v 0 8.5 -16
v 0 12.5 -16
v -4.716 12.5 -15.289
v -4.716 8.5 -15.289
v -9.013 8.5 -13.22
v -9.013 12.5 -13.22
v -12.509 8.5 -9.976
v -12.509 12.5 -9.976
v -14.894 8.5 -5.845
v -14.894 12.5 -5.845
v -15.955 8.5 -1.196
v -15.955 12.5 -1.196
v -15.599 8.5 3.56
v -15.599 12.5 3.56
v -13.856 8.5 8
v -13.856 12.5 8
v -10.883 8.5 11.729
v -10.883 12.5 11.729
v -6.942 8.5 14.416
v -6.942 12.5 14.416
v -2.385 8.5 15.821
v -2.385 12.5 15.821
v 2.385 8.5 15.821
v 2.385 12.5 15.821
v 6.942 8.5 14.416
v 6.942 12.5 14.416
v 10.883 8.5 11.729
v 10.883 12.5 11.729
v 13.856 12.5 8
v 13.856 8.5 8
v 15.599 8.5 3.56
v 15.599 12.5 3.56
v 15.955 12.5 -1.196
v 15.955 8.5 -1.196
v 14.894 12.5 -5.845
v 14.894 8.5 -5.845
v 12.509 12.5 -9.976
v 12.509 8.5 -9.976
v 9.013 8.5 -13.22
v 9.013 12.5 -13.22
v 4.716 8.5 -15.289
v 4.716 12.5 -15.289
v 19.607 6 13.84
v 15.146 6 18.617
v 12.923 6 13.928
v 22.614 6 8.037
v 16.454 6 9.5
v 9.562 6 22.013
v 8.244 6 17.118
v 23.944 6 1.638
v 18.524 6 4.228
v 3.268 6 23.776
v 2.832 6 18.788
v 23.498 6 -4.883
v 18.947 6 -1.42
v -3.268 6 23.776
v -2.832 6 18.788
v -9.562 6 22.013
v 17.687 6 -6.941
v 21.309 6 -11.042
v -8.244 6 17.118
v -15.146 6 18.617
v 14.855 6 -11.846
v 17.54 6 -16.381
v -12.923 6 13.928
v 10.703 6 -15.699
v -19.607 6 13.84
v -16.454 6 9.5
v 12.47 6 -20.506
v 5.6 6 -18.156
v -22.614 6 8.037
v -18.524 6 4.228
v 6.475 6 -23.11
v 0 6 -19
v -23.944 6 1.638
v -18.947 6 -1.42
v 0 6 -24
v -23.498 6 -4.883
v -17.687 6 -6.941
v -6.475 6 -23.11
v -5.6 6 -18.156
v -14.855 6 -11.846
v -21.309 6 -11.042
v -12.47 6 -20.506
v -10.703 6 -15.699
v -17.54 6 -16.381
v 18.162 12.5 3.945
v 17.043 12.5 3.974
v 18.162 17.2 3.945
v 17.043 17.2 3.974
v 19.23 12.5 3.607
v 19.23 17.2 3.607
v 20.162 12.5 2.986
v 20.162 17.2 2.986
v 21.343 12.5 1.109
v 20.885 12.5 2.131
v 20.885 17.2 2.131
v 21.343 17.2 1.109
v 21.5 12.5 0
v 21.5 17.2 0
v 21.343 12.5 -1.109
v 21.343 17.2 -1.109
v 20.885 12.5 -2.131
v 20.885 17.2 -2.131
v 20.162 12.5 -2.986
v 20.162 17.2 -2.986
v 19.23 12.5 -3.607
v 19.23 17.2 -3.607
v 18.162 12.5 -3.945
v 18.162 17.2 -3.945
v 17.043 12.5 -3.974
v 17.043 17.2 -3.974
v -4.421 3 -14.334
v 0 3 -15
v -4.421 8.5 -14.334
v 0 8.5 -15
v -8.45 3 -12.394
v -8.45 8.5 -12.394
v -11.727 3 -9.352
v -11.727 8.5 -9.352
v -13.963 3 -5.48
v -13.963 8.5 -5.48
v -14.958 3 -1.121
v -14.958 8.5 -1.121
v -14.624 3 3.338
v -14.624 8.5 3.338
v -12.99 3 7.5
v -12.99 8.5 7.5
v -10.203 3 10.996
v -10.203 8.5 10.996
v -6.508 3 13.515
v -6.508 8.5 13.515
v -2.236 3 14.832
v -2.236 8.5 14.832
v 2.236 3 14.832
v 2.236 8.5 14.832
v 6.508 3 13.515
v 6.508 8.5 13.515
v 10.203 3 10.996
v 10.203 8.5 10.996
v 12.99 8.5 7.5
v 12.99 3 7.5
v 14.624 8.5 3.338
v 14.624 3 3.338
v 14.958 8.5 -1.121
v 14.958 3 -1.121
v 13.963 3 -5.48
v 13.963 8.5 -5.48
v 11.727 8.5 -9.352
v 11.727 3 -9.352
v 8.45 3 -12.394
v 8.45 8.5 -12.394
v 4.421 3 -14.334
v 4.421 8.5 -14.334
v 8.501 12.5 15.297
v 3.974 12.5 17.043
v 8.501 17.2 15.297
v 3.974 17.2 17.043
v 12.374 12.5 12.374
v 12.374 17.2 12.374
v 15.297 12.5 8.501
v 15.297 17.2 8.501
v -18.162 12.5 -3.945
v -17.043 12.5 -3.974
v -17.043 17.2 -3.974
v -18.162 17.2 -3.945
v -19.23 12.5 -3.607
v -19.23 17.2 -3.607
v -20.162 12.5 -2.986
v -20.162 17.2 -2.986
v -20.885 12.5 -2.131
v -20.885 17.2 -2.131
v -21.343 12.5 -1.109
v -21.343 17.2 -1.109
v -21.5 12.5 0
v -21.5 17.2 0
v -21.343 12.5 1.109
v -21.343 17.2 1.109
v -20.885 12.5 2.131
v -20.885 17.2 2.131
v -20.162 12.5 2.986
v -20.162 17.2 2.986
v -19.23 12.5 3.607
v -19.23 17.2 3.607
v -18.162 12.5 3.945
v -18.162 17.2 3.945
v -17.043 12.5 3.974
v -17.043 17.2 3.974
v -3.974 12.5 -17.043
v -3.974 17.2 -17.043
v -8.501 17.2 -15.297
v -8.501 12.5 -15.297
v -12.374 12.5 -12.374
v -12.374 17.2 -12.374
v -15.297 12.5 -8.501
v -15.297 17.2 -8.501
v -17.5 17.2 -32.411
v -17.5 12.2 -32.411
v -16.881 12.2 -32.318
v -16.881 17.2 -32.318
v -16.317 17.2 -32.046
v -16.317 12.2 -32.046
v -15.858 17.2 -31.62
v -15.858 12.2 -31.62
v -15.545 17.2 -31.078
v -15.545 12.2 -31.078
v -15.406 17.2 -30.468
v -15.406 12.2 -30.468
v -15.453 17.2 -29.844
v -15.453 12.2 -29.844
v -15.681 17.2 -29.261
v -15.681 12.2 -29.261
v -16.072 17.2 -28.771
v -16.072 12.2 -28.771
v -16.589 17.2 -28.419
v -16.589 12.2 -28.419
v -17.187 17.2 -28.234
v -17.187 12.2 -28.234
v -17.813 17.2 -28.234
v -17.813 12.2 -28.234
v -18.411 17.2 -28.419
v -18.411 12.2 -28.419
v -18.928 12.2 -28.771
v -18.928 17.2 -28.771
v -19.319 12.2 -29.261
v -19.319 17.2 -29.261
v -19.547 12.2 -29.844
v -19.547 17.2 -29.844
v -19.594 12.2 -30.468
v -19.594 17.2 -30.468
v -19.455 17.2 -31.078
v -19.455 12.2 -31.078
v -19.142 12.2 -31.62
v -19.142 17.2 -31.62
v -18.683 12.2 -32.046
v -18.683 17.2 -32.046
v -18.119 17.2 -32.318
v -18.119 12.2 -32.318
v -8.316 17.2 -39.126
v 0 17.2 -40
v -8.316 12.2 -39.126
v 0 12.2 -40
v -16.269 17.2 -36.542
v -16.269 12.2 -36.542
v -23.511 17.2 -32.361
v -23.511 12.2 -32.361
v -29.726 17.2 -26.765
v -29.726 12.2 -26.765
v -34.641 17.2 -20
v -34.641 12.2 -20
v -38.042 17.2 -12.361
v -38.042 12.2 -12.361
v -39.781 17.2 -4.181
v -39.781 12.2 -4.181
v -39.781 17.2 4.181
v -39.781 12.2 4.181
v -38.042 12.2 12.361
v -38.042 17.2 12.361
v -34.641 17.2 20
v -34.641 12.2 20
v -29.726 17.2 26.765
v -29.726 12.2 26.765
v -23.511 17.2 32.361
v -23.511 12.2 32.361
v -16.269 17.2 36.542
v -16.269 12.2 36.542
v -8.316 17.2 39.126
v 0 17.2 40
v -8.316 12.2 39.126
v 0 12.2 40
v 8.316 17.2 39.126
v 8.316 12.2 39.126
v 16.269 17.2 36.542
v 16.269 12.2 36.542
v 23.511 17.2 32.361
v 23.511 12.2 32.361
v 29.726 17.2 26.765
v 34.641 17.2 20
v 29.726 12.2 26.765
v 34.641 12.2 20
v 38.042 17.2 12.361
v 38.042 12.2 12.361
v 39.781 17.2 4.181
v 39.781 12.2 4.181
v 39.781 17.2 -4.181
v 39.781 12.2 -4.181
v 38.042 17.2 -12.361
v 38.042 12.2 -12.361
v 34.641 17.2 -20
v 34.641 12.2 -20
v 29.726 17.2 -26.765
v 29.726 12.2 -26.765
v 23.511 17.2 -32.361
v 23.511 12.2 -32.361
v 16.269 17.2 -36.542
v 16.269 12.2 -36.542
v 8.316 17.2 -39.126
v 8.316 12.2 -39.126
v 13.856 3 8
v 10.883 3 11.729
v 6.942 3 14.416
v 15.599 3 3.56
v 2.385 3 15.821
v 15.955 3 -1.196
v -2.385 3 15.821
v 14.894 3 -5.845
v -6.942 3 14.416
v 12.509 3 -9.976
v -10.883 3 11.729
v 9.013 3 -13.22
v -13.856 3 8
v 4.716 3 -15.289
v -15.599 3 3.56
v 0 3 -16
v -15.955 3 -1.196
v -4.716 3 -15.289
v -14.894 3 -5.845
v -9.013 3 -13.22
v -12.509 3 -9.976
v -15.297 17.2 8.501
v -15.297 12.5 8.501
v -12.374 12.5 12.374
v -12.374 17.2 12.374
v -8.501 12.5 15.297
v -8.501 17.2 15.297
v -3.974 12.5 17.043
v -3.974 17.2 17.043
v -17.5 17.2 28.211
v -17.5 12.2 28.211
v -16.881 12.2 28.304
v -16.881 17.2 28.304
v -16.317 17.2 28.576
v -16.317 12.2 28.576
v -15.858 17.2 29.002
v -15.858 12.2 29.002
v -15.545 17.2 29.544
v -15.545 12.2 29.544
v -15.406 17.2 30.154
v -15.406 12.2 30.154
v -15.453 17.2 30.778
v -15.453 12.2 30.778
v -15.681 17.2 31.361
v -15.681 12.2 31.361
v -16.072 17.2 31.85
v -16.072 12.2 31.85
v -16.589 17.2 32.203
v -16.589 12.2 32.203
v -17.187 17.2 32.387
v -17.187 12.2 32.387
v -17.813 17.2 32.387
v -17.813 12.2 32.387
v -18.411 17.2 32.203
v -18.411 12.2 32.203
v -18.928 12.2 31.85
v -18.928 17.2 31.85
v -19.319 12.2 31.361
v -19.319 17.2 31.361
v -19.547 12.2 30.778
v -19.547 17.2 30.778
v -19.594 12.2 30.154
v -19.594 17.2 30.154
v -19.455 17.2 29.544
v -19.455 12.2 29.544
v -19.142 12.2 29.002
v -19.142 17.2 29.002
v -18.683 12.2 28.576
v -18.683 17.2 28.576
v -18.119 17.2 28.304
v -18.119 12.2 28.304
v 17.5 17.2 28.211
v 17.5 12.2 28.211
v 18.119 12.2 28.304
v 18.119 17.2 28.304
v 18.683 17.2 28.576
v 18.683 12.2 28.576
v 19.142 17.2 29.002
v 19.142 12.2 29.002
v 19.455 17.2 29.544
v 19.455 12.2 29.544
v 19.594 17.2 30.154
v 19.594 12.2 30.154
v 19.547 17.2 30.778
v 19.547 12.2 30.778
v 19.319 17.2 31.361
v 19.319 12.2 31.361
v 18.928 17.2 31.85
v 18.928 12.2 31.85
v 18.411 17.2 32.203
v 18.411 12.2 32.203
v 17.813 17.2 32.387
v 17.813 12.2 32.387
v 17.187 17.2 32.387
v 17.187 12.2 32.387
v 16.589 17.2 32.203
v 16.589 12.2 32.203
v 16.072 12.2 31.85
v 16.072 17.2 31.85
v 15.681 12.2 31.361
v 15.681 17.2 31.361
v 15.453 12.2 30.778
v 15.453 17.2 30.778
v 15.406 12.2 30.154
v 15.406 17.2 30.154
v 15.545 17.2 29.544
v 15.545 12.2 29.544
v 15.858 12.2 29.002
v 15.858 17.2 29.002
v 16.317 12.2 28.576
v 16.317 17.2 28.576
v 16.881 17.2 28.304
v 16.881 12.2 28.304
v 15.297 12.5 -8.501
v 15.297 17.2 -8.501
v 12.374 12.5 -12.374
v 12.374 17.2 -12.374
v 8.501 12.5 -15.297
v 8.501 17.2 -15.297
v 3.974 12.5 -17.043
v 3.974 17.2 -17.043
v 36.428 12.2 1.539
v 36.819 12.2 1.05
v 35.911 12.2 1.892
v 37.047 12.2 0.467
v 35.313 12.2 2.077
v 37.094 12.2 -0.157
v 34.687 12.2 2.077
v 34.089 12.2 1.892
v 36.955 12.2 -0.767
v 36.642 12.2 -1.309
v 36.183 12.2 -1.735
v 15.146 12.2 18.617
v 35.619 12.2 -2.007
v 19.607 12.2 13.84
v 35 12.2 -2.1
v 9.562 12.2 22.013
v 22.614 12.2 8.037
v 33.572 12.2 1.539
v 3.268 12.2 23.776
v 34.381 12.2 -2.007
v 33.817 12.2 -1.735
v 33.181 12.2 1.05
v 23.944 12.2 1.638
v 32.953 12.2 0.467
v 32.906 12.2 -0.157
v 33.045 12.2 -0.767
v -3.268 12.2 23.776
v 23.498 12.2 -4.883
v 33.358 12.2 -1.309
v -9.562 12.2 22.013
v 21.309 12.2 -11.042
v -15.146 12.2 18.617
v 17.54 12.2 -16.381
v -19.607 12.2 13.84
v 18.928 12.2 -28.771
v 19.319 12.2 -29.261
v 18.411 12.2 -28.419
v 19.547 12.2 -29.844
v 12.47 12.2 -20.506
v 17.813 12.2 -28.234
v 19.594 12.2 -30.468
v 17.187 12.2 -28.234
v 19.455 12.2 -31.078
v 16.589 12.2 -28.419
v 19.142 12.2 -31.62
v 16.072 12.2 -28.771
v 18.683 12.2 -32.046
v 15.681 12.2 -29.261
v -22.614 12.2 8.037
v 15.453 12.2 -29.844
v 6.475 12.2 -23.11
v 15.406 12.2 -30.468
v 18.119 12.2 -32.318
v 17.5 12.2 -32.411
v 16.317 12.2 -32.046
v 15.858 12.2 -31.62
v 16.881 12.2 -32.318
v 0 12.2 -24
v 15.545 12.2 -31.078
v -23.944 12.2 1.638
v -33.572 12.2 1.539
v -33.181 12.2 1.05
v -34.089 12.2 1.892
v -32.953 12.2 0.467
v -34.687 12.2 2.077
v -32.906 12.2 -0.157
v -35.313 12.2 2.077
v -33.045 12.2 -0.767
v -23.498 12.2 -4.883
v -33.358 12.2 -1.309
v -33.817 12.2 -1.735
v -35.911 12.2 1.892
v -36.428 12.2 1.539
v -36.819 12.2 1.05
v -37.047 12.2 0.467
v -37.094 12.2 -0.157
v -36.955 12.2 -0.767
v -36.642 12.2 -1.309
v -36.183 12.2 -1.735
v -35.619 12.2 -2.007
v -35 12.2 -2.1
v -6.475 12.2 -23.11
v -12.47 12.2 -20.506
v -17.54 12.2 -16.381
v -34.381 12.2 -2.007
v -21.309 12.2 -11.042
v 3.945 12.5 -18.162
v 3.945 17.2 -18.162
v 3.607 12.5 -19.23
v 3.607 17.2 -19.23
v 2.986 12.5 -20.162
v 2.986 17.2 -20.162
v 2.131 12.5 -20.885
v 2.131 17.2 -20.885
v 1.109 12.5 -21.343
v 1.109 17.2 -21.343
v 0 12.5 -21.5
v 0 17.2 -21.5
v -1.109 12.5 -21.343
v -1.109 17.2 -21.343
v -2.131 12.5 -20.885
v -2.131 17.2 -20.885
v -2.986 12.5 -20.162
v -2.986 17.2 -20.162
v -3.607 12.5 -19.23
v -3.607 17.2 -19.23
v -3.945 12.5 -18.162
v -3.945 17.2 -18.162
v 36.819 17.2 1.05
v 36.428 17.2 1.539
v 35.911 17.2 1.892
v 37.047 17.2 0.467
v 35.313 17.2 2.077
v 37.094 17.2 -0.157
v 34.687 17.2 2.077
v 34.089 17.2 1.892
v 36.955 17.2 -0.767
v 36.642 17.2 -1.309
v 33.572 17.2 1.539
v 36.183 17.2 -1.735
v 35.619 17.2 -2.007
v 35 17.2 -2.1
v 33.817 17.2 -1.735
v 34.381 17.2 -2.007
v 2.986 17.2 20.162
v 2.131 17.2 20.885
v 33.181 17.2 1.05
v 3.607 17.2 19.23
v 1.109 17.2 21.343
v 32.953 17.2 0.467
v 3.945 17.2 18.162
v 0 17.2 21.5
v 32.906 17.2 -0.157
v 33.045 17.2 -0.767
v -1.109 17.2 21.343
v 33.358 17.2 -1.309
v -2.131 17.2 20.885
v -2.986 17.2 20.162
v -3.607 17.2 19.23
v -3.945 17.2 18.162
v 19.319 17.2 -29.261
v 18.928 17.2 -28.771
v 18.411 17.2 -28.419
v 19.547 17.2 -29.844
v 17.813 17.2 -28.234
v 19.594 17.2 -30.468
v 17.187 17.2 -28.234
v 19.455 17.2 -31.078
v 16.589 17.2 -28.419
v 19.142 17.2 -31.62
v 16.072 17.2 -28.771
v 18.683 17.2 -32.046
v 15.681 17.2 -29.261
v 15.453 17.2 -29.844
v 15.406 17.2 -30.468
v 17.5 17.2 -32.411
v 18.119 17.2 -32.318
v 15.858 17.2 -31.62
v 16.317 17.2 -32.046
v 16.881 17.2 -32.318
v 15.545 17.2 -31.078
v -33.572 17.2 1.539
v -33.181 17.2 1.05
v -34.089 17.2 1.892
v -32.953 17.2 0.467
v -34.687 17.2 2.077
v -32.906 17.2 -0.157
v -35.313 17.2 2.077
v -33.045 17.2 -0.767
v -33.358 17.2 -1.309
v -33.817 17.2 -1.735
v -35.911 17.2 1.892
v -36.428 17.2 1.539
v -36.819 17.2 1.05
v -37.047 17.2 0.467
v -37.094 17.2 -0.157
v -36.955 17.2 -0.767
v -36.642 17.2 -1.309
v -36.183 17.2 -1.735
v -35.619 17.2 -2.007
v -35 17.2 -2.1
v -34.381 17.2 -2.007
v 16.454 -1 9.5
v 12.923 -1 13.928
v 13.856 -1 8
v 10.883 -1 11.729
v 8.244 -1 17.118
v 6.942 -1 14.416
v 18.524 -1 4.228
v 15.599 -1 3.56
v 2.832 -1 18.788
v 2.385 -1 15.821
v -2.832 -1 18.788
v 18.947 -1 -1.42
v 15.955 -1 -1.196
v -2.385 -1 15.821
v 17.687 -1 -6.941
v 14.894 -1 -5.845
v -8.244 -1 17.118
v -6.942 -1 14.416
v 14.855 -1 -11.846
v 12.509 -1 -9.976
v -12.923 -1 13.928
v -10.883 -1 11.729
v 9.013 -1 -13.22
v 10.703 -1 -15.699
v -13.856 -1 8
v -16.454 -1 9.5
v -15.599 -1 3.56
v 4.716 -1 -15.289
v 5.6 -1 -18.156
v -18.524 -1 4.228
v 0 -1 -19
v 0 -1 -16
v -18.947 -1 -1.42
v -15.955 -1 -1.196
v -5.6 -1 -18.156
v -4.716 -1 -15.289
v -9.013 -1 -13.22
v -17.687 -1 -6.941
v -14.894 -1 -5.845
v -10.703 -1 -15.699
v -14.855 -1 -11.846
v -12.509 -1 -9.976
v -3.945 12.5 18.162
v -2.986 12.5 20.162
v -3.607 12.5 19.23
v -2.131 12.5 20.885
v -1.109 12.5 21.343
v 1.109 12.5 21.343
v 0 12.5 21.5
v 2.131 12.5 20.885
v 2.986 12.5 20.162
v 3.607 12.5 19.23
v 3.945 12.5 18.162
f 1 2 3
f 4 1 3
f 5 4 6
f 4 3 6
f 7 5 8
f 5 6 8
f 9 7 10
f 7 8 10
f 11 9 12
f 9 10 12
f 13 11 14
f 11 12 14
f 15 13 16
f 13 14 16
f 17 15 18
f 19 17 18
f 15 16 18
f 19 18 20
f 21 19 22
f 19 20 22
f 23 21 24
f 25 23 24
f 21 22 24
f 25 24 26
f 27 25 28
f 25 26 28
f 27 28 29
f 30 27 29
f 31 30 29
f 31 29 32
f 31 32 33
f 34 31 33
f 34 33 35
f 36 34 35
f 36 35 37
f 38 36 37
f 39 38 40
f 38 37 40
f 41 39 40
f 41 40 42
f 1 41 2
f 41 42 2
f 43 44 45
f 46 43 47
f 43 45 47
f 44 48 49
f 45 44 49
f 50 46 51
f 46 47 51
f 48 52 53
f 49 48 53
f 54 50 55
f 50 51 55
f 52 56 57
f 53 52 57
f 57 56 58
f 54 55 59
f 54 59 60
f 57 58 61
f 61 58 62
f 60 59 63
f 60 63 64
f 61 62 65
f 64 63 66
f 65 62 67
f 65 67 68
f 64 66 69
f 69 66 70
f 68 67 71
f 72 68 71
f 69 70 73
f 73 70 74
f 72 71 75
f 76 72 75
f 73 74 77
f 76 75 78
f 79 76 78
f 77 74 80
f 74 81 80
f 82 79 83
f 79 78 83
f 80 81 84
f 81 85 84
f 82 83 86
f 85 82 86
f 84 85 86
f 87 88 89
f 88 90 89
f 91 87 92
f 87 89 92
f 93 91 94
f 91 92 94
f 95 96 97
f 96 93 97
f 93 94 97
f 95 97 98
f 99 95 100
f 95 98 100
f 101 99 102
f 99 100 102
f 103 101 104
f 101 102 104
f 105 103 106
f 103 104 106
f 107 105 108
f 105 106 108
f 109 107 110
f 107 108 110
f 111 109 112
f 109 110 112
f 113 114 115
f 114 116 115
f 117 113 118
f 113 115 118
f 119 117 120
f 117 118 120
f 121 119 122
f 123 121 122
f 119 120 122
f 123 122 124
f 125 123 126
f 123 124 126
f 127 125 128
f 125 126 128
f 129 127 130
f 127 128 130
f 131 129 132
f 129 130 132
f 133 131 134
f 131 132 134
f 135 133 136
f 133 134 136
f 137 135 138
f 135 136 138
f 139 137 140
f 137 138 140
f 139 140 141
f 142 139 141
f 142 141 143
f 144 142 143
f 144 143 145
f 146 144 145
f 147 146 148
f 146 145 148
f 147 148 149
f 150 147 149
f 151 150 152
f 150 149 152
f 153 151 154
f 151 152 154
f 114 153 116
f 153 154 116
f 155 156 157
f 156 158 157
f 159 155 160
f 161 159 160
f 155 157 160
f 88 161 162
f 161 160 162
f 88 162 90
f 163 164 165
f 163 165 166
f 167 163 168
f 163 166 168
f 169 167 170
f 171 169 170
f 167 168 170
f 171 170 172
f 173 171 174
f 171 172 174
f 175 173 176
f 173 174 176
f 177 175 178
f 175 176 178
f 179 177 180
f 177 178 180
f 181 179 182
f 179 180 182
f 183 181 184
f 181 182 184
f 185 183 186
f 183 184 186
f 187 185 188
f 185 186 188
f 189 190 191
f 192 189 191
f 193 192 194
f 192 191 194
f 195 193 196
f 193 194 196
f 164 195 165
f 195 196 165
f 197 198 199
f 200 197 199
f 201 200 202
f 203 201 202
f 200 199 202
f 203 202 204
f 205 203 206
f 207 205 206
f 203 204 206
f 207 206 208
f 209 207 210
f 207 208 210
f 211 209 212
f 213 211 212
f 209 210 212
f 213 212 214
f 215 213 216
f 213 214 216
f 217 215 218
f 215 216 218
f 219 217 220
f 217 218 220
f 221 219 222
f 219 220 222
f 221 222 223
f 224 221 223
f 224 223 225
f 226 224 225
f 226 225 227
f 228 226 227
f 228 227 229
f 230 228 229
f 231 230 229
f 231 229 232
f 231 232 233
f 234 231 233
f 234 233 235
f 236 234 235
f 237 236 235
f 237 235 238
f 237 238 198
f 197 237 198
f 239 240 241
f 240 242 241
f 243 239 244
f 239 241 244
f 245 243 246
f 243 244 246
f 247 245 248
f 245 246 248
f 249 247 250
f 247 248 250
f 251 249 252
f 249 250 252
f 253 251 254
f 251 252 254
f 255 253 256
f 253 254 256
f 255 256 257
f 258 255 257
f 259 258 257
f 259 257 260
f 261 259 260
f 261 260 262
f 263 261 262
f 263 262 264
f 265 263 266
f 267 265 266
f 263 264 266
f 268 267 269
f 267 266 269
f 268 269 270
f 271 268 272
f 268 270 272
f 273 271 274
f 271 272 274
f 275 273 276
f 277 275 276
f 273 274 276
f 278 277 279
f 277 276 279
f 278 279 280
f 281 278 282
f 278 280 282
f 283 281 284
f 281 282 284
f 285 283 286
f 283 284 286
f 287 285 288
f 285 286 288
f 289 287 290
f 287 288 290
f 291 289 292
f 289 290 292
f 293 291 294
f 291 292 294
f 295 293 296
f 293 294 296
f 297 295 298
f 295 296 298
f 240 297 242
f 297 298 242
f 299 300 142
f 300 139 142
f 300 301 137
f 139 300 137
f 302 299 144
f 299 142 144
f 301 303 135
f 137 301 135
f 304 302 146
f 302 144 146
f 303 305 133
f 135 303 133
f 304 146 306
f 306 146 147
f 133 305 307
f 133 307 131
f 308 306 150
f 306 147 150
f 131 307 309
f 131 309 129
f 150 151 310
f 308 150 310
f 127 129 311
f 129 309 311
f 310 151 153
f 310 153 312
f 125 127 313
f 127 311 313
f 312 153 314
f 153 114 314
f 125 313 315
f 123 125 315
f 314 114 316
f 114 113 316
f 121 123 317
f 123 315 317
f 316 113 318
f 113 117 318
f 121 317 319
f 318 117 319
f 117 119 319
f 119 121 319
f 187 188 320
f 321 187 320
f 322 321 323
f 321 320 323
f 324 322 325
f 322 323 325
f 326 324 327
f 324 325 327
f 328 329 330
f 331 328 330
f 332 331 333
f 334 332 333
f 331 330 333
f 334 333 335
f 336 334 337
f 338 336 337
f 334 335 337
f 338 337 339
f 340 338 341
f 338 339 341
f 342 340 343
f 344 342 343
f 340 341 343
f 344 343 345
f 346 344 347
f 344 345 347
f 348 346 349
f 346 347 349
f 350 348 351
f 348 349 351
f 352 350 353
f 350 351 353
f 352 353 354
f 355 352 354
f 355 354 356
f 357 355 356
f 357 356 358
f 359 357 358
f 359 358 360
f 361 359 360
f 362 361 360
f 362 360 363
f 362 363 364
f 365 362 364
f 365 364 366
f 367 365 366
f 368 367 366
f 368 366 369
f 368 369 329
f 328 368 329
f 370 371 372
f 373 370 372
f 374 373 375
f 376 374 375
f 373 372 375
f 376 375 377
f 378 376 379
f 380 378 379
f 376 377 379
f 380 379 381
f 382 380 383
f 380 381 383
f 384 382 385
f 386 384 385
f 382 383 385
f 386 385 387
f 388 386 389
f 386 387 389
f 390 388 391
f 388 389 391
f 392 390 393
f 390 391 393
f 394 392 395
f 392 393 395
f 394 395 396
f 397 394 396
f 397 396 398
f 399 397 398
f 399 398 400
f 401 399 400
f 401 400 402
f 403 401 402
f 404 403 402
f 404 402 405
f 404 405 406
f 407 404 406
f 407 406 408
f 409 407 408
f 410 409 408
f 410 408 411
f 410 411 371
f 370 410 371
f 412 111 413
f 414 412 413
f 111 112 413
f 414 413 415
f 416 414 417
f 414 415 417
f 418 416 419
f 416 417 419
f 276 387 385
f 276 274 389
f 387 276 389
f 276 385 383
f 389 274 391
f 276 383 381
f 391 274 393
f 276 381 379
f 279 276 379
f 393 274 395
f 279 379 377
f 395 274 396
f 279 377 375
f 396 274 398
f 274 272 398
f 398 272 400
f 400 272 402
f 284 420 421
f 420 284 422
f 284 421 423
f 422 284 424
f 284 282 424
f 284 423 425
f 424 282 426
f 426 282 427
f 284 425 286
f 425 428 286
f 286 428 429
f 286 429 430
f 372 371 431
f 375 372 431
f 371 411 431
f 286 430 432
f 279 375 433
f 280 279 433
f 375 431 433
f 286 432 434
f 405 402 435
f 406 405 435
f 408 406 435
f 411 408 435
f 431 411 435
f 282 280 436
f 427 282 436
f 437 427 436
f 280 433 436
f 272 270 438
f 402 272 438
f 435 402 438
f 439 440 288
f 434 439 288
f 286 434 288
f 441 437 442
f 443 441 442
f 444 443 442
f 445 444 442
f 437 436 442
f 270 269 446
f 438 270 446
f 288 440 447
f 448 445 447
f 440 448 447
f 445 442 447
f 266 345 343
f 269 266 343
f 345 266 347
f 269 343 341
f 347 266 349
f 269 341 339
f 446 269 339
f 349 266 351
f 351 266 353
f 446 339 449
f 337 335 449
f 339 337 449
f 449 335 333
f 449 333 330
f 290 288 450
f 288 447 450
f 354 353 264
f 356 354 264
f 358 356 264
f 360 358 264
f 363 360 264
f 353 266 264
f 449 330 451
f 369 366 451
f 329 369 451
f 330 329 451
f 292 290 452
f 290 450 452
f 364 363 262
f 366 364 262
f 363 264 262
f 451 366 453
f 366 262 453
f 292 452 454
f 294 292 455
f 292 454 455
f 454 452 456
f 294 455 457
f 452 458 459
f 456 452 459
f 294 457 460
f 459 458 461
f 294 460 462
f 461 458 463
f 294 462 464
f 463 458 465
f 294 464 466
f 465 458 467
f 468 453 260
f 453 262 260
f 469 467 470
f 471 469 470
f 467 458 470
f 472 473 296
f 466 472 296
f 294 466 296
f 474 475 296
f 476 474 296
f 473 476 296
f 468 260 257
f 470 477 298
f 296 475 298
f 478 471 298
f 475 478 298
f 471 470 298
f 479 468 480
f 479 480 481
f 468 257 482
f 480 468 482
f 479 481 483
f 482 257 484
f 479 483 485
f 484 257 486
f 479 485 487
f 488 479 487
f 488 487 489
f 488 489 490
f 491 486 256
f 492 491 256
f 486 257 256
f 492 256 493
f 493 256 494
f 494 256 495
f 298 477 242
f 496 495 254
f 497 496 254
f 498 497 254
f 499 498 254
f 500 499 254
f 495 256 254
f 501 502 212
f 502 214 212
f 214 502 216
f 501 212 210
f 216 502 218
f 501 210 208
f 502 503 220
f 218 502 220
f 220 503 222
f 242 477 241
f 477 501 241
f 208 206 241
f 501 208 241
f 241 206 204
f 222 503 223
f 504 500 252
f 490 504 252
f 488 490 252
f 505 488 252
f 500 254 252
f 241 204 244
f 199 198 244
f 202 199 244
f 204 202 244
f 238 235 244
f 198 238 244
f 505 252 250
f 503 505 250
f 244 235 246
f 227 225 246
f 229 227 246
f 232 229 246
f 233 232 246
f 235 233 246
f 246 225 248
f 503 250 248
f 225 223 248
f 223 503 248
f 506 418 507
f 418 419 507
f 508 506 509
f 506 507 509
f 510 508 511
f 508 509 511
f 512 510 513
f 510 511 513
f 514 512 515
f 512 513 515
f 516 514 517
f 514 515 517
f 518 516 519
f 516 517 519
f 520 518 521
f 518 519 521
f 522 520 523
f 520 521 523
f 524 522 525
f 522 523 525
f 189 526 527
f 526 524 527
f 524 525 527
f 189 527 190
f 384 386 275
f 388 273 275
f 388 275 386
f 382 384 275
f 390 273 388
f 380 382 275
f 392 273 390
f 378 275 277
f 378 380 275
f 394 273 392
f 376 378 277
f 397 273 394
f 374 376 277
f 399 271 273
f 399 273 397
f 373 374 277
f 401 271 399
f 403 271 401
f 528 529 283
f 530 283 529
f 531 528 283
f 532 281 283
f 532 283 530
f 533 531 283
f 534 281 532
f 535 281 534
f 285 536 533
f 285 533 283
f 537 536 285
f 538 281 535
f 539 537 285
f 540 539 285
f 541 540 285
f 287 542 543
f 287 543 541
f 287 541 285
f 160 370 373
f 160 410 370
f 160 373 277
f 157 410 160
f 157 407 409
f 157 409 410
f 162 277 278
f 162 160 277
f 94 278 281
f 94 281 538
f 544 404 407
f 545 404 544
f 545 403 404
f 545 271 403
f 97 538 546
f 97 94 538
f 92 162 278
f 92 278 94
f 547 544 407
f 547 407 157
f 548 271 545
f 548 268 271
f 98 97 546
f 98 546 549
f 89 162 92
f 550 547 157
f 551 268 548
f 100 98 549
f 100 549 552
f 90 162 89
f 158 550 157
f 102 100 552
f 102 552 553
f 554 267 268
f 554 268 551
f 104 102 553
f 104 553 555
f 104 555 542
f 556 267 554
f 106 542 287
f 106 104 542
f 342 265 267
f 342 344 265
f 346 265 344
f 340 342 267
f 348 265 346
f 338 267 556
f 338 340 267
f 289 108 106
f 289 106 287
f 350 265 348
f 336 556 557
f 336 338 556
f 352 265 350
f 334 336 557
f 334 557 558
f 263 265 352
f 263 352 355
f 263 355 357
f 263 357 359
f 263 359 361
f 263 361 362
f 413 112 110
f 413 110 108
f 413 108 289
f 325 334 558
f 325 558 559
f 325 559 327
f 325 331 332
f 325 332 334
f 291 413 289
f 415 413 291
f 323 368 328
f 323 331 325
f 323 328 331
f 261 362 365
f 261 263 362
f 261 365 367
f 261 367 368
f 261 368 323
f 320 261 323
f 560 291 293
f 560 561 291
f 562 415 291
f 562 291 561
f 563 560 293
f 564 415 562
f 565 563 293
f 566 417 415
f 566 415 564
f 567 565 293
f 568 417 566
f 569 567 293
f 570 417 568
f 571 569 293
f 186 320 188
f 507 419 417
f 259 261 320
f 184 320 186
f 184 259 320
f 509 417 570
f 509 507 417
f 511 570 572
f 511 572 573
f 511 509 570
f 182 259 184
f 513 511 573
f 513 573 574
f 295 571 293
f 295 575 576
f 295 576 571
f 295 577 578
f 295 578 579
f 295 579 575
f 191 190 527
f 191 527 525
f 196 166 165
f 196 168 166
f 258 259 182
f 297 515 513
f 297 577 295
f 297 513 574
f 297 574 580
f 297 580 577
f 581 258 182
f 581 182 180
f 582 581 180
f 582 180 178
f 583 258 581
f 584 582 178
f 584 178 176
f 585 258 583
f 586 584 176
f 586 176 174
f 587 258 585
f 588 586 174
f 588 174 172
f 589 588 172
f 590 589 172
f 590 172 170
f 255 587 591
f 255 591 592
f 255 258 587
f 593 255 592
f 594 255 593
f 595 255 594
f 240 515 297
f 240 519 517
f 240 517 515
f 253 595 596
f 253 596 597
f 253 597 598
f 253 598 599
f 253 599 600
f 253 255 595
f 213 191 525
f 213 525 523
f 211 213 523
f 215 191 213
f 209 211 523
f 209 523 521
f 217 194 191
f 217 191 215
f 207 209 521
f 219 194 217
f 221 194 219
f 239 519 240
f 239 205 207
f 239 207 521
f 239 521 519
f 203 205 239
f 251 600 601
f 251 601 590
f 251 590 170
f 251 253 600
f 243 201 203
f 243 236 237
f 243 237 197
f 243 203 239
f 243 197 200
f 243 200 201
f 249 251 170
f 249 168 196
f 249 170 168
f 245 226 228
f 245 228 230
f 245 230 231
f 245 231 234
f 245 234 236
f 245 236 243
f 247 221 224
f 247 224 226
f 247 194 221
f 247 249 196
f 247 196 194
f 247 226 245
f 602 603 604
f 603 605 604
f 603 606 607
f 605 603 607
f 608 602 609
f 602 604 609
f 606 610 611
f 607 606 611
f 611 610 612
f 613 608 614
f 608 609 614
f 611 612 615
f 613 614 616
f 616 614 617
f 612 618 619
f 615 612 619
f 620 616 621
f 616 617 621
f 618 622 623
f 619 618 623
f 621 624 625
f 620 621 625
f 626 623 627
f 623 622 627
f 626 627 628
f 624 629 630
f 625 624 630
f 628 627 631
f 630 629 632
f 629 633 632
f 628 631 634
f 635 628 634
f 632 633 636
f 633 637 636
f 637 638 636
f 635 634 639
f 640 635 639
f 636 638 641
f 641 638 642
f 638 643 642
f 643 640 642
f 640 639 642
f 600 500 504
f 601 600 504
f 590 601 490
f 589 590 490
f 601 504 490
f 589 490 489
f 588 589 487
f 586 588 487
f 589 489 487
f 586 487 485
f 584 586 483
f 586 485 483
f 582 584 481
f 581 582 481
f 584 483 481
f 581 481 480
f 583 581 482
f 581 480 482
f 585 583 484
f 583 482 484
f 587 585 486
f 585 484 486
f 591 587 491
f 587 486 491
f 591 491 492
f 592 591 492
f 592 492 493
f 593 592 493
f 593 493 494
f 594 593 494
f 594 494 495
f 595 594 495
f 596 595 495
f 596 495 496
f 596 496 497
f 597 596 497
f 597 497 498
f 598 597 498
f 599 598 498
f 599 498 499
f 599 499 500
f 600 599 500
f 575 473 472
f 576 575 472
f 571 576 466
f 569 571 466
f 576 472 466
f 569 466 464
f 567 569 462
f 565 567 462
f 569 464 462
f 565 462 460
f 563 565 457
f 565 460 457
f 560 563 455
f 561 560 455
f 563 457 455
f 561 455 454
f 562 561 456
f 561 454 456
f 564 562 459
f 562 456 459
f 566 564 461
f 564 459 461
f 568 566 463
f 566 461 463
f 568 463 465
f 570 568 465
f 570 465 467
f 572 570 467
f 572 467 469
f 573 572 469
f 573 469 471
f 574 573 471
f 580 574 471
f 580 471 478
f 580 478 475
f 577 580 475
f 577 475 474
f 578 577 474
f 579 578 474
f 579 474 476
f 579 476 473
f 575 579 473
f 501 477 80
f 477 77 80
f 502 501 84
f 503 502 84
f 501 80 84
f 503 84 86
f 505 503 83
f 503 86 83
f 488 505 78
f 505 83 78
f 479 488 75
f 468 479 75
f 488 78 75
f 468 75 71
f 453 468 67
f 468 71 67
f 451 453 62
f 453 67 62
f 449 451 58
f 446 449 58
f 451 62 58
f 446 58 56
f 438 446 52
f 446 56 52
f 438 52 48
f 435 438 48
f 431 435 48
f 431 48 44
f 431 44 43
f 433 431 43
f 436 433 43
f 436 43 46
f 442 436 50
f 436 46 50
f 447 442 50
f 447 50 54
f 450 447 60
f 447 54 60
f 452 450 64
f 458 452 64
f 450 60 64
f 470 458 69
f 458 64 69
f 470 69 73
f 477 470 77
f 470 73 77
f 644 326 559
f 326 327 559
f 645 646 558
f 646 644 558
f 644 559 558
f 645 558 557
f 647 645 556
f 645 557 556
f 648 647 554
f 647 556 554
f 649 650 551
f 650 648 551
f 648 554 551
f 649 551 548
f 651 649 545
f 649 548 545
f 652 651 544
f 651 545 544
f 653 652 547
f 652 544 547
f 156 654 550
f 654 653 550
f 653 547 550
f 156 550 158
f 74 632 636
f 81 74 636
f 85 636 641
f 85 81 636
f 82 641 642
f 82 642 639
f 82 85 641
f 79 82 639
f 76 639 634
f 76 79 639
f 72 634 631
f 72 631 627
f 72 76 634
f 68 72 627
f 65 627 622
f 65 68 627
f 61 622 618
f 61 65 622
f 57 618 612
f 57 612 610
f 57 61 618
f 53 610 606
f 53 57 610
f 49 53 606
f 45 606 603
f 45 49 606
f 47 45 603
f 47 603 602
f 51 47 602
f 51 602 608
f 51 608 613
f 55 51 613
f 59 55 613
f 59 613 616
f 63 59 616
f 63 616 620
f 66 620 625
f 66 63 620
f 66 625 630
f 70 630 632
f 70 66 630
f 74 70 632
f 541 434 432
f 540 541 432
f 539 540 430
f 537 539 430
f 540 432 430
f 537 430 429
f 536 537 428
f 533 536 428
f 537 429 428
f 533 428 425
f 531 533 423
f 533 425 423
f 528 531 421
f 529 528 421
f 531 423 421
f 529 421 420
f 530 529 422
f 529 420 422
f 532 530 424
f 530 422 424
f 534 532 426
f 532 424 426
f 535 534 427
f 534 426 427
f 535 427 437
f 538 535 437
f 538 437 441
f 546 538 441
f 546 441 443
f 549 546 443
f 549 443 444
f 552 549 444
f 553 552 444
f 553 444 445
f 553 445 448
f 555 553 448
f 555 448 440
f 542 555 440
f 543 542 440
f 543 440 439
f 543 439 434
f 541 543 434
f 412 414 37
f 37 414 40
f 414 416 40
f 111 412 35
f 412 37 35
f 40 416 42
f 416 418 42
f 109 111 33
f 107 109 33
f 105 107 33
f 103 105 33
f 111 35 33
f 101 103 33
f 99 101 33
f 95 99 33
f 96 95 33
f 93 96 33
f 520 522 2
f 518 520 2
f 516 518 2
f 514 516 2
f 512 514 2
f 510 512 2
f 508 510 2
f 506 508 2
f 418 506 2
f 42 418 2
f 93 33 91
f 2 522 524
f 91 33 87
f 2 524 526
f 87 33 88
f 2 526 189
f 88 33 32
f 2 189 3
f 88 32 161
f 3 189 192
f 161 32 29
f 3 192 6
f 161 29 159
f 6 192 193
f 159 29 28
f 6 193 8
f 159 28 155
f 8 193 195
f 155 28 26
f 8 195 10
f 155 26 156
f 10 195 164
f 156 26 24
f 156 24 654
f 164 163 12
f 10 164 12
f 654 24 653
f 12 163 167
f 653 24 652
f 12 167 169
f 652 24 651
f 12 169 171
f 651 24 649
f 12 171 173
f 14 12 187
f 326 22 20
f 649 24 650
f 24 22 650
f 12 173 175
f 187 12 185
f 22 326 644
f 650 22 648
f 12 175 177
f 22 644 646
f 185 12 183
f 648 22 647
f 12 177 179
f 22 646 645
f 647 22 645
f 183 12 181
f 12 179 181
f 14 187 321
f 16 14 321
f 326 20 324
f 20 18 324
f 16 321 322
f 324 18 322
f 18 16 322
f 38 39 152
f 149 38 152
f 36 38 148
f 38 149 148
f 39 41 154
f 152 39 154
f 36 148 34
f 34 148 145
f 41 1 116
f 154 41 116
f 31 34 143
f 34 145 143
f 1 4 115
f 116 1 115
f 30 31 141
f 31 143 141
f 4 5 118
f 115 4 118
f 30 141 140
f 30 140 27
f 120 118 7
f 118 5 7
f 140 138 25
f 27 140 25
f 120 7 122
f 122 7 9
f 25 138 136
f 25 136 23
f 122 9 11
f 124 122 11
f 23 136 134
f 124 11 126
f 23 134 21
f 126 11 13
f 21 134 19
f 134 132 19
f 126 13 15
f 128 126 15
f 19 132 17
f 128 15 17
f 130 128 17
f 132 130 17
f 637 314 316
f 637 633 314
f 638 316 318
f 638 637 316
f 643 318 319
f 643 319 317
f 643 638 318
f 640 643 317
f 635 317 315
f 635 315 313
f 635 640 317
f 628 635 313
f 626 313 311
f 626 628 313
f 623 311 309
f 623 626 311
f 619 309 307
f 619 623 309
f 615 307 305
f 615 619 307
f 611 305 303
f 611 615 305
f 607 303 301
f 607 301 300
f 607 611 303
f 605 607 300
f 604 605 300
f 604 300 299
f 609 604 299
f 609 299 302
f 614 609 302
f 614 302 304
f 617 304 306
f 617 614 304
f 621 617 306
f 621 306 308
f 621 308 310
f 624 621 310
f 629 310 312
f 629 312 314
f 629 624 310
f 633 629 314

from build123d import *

# Parameters (mm, degrees)
SKETCH_4_R          = 4
CUT_EXTRUDE_1_DEPTH = 4.7
HOLE_WIZARD_M5_1_D  = 4.2


with BuildPart() as part:
    # 草图1 → 旋转1 (revolve)
    with BuildSketch(Plane.XY, mode=Mode.PRIVATE) as revolve_1_sk:
        Polygon((24, 12.2), (24, 6), (19, 6), (19, 0), (19, -1), (16, -1), (16, 0), (16, 3), (15, 3), (15, 8.5), (16, 8.5), (16, 12.5), (17.5, 12.5), (17.5, 17.2), (21.5, 17.2), (40, 17.2), (40, 12.2), align=None)
    revolve(revolve_1_sk.sketch.rotate(Axis((0, 0, 0), (0, 1, 0)), 90), axis=Axis((0, 0, 0), (0, 1, 0)))

    # 草图4 → 切除-拉伸1 (cut)
    with BuildSketch(Plane(origin=(0, 17.2, 0), x_dir=(1, 0, 0), z_dir=(0, 1, 0))):
        with Locations((0, -17.5)):
            Circle(SKETCH_4_R)
        with Locations((17.5, 0)):
            Circle(SKETCH_4_R)
        with Locations((0, 17.5)):
            Circle(SKETCH_4_R)
        with Locations((-17.5, 0)):
            Circle(SKETCH_4_R)
    extrude(amount=-CUT_EXTRUDE_1_DEPTH, mode=Mode.SUBTRACT)

    # M5 螺纹孔1 (through all)
    with Locations(Plane(origin=(17.5, 17.2, -30.310889132), x_dir=(0, 0, 1), z_dir=(0, 1, 0))):
        with Locations((0, 0), (30.310889132, 17.5), (60.621778264, 0), (60.621778264, -35), (30.310889132, -52.5), (0, -35)):
            Hole(HOLE_WIZARD_M5_1_D / 2)


solid = part.part
